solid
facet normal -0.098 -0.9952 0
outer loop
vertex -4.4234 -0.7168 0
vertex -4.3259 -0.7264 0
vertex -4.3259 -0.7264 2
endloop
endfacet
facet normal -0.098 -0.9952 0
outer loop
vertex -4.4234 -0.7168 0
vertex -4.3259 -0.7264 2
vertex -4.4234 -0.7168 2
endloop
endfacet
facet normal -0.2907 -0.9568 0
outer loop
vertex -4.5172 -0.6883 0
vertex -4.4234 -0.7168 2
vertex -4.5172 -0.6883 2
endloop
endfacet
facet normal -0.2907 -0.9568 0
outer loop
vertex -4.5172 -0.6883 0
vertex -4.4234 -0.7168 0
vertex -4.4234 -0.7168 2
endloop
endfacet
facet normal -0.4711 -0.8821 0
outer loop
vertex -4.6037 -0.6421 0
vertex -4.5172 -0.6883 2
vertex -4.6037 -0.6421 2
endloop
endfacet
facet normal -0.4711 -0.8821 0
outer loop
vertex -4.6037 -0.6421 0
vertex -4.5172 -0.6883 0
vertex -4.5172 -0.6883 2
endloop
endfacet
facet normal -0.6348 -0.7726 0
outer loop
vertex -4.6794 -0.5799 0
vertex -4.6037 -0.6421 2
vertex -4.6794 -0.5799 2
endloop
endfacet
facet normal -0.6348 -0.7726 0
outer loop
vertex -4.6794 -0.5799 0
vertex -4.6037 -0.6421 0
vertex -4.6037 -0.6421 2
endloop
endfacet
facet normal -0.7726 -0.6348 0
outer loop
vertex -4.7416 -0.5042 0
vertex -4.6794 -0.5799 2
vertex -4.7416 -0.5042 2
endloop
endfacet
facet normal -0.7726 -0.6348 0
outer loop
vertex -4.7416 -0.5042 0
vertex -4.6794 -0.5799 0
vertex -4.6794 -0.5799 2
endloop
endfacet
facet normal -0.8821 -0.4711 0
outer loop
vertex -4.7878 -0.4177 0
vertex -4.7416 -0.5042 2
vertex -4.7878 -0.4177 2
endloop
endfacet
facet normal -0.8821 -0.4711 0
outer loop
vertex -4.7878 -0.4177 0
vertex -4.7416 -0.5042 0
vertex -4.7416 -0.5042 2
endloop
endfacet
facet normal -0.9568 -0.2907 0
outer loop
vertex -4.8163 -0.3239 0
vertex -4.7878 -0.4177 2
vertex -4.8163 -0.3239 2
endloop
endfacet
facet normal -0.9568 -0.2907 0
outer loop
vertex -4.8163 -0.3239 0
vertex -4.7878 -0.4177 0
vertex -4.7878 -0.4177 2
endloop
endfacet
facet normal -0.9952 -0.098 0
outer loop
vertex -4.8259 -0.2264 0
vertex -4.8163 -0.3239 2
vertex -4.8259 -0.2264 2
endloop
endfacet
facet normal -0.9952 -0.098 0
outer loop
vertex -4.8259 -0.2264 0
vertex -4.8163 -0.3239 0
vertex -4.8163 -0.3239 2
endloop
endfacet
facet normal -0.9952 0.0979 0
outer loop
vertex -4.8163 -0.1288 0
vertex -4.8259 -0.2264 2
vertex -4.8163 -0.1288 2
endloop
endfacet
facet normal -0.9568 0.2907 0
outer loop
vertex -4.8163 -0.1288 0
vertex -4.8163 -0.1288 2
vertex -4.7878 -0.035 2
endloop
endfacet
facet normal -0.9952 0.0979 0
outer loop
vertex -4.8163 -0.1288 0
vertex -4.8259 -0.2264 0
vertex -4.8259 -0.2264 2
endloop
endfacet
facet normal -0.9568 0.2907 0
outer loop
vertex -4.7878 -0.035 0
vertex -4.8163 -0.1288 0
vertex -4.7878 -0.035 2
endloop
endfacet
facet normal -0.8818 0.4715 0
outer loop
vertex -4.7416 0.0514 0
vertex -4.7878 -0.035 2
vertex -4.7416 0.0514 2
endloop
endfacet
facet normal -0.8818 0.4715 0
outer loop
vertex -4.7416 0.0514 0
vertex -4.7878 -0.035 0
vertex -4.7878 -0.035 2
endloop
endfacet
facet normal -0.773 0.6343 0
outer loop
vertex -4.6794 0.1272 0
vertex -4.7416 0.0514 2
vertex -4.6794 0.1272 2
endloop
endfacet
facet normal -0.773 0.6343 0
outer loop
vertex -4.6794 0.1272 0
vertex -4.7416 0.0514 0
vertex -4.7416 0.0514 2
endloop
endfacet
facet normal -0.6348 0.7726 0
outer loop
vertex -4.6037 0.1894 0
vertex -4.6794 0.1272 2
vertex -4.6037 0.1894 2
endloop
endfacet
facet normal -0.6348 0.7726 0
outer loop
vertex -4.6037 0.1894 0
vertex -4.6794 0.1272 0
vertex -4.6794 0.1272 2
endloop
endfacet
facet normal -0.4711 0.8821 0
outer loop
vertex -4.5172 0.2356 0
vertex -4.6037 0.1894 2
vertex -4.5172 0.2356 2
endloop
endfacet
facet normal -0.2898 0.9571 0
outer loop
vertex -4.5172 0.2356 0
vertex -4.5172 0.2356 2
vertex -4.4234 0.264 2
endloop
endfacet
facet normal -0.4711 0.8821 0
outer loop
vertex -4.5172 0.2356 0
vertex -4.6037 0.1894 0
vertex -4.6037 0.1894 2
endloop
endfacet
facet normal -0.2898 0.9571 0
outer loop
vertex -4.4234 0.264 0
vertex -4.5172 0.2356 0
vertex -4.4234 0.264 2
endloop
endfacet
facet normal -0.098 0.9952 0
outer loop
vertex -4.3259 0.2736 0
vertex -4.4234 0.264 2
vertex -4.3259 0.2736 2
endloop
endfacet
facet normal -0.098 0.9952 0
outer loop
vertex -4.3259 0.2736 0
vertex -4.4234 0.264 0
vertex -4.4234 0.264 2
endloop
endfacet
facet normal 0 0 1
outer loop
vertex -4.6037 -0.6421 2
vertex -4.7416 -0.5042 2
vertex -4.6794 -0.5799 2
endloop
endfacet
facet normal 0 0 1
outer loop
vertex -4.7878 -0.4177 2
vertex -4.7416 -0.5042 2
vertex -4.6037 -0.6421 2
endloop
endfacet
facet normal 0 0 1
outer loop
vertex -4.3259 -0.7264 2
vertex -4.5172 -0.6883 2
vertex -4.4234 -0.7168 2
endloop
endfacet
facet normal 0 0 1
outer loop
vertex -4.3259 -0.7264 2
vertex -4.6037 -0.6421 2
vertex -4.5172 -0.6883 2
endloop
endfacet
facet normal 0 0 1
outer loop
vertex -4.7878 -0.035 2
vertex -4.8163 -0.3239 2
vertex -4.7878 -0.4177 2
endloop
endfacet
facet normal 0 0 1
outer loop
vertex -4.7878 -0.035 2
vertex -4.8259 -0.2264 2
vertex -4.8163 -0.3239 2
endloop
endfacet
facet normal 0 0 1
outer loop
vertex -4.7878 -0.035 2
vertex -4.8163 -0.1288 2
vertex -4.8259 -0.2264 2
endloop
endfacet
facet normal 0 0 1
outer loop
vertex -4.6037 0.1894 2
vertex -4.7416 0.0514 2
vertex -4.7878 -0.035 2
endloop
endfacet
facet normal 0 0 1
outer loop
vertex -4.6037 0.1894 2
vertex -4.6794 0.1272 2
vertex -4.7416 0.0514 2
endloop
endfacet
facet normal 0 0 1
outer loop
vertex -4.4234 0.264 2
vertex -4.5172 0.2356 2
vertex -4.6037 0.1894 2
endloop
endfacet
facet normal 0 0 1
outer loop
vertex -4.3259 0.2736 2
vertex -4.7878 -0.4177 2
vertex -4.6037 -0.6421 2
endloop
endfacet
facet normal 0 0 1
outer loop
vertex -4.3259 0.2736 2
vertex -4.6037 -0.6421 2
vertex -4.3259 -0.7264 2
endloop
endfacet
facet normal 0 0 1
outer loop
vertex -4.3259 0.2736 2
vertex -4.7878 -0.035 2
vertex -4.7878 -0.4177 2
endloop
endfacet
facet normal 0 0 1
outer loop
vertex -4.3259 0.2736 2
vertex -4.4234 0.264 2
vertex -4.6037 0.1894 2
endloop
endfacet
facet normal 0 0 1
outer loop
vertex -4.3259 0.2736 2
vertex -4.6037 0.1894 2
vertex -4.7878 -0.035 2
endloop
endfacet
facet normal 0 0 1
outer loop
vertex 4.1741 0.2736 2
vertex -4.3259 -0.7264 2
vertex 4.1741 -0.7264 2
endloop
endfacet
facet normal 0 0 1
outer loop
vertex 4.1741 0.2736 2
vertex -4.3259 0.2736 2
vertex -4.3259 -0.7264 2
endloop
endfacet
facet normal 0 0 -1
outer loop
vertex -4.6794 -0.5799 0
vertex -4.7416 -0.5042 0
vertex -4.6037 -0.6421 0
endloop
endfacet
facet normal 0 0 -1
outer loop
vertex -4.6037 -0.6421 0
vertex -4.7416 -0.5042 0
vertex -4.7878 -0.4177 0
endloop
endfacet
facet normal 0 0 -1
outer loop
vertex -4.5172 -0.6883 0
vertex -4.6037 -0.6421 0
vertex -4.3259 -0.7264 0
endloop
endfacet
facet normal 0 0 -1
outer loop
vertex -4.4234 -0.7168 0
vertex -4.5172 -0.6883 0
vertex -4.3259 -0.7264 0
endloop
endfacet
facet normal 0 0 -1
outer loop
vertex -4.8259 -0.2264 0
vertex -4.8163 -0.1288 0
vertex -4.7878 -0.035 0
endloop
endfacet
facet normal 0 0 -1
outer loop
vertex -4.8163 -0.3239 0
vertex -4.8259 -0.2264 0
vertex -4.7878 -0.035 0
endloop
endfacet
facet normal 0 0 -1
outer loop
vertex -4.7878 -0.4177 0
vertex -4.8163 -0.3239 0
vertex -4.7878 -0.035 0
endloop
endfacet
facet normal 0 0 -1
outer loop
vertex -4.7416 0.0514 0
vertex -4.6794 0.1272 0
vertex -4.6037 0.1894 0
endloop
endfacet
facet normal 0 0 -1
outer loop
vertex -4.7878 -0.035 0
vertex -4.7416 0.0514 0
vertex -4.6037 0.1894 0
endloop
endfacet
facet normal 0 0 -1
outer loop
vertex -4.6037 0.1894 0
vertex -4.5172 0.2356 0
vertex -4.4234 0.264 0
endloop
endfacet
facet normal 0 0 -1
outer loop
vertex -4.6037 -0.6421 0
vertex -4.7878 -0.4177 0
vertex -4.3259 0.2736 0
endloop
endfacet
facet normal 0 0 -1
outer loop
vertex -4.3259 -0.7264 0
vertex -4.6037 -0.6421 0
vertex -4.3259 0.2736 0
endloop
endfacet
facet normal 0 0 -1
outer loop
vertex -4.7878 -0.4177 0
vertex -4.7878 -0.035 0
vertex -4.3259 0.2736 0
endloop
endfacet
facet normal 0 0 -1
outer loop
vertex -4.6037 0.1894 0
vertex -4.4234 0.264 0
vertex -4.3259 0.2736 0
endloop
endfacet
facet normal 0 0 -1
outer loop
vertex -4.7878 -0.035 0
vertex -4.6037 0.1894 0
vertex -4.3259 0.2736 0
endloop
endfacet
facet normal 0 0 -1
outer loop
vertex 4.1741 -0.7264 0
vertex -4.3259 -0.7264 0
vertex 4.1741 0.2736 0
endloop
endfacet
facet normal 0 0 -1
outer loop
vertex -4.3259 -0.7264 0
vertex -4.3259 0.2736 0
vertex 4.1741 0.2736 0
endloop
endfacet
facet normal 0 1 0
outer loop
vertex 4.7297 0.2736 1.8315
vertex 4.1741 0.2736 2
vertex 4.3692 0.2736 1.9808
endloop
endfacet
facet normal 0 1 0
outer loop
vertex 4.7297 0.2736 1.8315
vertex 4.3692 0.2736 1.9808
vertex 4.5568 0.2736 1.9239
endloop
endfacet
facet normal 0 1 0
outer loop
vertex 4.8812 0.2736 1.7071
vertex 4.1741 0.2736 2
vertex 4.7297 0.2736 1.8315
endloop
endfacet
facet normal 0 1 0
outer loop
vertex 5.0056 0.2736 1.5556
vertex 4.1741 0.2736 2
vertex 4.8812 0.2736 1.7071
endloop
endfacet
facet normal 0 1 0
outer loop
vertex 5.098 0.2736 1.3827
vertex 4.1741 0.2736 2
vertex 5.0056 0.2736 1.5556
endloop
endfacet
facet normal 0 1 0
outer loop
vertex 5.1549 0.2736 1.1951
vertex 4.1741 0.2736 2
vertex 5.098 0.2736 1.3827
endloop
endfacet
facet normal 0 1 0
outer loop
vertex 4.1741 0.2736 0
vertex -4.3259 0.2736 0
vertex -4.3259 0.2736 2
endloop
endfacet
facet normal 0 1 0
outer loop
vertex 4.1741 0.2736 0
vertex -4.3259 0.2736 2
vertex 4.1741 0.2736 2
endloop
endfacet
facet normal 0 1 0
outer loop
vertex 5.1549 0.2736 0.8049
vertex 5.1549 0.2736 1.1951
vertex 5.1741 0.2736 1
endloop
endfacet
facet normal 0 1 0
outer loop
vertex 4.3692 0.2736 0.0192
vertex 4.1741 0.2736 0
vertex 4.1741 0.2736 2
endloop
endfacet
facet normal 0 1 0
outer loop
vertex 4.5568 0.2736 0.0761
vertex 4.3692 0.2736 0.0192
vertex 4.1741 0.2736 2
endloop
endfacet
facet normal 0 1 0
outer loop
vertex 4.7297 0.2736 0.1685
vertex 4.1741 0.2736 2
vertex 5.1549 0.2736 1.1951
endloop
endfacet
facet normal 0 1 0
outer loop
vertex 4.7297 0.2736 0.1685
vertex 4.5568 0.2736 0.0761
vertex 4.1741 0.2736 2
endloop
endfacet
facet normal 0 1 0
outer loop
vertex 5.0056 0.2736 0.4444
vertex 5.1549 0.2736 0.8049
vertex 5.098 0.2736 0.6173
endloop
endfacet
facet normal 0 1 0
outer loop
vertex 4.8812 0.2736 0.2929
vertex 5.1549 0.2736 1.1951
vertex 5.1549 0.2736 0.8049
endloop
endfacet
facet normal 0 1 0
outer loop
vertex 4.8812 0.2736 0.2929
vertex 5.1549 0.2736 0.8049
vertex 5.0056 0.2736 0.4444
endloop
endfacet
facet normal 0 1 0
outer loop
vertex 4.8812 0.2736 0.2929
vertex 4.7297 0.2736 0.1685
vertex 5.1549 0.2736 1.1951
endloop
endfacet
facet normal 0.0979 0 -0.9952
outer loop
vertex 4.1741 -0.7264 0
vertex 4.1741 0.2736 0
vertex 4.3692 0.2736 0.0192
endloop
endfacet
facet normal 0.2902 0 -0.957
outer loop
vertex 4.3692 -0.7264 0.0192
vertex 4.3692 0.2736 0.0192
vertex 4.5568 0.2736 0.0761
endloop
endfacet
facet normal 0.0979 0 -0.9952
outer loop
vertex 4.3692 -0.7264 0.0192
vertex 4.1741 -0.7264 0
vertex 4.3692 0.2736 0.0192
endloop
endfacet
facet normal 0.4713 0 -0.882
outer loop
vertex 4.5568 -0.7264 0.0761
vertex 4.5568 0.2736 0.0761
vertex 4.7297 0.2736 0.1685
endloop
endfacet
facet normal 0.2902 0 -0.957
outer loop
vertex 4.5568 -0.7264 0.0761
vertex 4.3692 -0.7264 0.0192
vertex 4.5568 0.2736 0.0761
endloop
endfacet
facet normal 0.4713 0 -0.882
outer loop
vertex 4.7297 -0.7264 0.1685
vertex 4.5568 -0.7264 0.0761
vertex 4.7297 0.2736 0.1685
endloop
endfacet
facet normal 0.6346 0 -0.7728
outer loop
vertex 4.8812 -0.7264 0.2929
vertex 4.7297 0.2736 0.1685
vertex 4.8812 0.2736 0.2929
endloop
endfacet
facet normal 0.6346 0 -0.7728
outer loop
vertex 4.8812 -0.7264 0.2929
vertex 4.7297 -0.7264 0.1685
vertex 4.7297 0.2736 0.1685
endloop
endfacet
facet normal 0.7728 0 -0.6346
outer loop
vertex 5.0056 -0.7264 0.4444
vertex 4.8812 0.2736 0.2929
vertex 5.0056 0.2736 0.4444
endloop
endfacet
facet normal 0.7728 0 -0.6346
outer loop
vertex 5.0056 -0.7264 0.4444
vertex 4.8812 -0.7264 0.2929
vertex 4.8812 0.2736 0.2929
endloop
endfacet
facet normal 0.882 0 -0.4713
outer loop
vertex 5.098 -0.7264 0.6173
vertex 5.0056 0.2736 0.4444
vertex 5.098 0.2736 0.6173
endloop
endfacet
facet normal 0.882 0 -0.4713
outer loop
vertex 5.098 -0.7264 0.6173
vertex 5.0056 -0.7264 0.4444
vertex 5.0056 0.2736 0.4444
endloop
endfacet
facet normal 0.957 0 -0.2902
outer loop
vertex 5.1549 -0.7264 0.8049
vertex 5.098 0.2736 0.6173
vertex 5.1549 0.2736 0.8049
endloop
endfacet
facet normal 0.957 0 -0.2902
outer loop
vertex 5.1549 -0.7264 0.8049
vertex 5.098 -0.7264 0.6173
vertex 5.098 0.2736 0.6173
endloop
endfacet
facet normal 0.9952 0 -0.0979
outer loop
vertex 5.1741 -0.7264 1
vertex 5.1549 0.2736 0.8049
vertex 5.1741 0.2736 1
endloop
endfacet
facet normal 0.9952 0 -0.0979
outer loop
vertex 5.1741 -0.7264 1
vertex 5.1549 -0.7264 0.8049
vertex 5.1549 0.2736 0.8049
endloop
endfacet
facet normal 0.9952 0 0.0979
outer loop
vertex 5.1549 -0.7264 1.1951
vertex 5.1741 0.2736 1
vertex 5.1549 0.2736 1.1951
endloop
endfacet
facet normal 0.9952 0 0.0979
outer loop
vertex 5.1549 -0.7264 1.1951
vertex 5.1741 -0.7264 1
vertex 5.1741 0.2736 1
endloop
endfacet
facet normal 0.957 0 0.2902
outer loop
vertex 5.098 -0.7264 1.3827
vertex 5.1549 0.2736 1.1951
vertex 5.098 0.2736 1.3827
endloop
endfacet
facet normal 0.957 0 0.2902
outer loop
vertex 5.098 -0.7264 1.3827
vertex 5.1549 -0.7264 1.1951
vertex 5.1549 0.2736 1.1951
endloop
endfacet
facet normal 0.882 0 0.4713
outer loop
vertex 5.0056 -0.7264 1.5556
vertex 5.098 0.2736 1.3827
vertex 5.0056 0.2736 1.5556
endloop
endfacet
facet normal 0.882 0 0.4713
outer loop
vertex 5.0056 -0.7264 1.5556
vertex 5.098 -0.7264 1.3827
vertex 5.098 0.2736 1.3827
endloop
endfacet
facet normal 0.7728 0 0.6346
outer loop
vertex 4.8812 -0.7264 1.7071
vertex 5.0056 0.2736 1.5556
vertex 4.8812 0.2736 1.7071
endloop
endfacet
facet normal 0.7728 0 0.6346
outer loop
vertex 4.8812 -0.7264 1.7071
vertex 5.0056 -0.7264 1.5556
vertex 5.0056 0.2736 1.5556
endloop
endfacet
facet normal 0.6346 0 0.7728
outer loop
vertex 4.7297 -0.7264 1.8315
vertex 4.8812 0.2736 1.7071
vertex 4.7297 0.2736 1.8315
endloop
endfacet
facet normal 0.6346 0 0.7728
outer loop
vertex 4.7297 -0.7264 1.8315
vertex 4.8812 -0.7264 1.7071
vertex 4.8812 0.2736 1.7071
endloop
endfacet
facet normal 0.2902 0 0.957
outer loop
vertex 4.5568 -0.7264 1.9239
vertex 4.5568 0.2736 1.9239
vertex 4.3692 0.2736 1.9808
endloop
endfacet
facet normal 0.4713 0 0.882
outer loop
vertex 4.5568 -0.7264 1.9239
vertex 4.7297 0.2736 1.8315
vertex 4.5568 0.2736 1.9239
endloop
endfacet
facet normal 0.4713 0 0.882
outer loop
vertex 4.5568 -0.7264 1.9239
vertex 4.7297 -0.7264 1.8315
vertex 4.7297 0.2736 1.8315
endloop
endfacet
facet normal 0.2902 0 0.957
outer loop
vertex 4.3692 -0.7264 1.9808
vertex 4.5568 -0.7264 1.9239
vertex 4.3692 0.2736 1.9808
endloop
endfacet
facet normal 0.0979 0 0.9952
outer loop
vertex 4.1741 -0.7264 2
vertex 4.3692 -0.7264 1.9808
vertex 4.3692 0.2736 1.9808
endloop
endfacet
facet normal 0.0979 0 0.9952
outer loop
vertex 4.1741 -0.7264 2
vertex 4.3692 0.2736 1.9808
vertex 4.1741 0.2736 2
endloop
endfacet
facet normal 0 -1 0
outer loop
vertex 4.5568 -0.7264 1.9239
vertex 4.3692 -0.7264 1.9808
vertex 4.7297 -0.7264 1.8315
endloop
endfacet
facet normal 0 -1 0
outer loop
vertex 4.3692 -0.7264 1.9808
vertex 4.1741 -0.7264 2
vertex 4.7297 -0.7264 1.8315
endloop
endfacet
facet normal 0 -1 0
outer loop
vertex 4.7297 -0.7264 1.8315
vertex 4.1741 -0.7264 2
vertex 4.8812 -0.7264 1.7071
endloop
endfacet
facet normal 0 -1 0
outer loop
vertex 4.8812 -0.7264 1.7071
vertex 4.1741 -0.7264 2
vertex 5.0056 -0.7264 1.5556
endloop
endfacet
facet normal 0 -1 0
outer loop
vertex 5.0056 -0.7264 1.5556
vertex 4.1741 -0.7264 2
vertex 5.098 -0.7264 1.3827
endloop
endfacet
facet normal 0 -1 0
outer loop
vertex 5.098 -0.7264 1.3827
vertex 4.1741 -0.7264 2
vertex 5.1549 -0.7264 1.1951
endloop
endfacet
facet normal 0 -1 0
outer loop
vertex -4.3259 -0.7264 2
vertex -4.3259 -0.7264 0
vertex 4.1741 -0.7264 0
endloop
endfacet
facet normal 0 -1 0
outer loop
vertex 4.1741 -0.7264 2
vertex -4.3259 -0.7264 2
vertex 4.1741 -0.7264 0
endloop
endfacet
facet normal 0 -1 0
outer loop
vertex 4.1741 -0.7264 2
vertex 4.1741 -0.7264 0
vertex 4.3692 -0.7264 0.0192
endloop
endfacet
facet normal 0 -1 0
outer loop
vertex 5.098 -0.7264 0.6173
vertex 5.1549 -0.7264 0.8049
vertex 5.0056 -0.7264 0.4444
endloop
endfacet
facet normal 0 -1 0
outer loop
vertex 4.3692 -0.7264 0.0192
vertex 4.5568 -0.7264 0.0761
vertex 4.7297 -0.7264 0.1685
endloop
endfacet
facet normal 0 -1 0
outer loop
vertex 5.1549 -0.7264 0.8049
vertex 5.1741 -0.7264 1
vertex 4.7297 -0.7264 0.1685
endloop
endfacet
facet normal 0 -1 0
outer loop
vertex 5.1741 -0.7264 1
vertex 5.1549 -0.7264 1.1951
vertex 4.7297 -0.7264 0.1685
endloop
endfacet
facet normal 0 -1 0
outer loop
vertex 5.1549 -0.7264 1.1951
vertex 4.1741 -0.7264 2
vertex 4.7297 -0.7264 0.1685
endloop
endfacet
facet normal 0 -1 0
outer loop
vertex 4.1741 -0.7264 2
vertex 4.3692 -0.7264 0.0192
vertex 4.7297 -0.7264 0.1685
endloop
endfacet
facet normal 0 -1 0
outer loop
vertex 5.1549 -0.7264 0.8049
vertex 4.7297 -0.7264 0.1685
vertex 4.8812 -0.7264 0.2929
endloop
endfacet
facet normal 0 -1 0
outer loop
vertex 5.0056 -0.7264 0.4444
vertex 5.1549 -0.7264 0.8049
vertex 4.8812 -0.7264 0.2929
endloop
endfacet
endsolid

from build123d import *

# Parameters (mm, degrees)
SKETCH1_W           = 10
SKETCH1_H           = 1
BOSS_EXTRUDE1_DEPTH = 2
FILLET1_RADIUS      = 1
FILLET1_LENGTH      = 1
FILLET2_RADIUS      = 0.5
FILLET2_LENGTH      = 2


with BuildPart() as part:
    # Sketch1 → Boss-Extrude1 (new body)
    with BuildSketch(Plane.XY):
        with Locations((0.174129353, -0.226368159)):
            Rectangle(SKETCH1_W, SKETCH1_H)
    extrude(amount=BOSS_EXTRUDE1_DEPTH)

    # Fillet1: full round fillet: the end face becomes a half cylinder, R = half its width
    fillet1_face = Plane((5.174129353, -0.226368159, 1), x_dir=(0, -1, 0), z_dir=(1, 0, 0))  # on the end face: x along it, z out of the body
    fillet1_slab = fillet1_face.offset(-FILLET1_RADIUS / 2) * Box(FILLET1_LENGTH, 2 * FILLET1_RADIUS, FILLET1_RADIUS, mode=Mode.PRIVATE)  # the body's end, R deep
    fillet1_round = Plane((4.174129353, -0.226368159, 1), x_dir=(1, 0, 0), z_dir=(0, -1, 0)) * Cylinder(FILLET1_RADIUS, FILLET1_LENGTH, mode=Mode.PRIVATE)  # its axis R under the face
    add(fillet1_slab - fillet1_round, mode=Mode.SUBTRACT)

    # Fillet2: full round fillet: the end face becomes a half cylinder, R = half its width
    fillet2_face = Plane((-4.825870647, -0.226368159, 1), x_dir=(0, 0, -1), z_dir=(-1, 0, 0))  # on the end face: x along it, z out of the body
    fillet2_slab = fillet2_face.offset(-FILLET2_RADIUS / 2) * Box(FILLET2_LENGTH, 2 * FILLET2_RADIUS, FILLET2_RADIUS, mode=Mode.PRIVATE)  # the body's end, R deep
    fillet2_round = Plane((-4.325870647, -0.226368159, 1), x_dir=(-1, 0, 0), z_dir=(0, 0, -1)) * Cylinder(FILLET2_RADIUS, FILLET2_LENGTH, mode=Mode.PRIVATE)  # its axis R under the face
    add(fillet2_slab - fillet2_round, mode=Mode.SUBTRACT)


solid = part.part
